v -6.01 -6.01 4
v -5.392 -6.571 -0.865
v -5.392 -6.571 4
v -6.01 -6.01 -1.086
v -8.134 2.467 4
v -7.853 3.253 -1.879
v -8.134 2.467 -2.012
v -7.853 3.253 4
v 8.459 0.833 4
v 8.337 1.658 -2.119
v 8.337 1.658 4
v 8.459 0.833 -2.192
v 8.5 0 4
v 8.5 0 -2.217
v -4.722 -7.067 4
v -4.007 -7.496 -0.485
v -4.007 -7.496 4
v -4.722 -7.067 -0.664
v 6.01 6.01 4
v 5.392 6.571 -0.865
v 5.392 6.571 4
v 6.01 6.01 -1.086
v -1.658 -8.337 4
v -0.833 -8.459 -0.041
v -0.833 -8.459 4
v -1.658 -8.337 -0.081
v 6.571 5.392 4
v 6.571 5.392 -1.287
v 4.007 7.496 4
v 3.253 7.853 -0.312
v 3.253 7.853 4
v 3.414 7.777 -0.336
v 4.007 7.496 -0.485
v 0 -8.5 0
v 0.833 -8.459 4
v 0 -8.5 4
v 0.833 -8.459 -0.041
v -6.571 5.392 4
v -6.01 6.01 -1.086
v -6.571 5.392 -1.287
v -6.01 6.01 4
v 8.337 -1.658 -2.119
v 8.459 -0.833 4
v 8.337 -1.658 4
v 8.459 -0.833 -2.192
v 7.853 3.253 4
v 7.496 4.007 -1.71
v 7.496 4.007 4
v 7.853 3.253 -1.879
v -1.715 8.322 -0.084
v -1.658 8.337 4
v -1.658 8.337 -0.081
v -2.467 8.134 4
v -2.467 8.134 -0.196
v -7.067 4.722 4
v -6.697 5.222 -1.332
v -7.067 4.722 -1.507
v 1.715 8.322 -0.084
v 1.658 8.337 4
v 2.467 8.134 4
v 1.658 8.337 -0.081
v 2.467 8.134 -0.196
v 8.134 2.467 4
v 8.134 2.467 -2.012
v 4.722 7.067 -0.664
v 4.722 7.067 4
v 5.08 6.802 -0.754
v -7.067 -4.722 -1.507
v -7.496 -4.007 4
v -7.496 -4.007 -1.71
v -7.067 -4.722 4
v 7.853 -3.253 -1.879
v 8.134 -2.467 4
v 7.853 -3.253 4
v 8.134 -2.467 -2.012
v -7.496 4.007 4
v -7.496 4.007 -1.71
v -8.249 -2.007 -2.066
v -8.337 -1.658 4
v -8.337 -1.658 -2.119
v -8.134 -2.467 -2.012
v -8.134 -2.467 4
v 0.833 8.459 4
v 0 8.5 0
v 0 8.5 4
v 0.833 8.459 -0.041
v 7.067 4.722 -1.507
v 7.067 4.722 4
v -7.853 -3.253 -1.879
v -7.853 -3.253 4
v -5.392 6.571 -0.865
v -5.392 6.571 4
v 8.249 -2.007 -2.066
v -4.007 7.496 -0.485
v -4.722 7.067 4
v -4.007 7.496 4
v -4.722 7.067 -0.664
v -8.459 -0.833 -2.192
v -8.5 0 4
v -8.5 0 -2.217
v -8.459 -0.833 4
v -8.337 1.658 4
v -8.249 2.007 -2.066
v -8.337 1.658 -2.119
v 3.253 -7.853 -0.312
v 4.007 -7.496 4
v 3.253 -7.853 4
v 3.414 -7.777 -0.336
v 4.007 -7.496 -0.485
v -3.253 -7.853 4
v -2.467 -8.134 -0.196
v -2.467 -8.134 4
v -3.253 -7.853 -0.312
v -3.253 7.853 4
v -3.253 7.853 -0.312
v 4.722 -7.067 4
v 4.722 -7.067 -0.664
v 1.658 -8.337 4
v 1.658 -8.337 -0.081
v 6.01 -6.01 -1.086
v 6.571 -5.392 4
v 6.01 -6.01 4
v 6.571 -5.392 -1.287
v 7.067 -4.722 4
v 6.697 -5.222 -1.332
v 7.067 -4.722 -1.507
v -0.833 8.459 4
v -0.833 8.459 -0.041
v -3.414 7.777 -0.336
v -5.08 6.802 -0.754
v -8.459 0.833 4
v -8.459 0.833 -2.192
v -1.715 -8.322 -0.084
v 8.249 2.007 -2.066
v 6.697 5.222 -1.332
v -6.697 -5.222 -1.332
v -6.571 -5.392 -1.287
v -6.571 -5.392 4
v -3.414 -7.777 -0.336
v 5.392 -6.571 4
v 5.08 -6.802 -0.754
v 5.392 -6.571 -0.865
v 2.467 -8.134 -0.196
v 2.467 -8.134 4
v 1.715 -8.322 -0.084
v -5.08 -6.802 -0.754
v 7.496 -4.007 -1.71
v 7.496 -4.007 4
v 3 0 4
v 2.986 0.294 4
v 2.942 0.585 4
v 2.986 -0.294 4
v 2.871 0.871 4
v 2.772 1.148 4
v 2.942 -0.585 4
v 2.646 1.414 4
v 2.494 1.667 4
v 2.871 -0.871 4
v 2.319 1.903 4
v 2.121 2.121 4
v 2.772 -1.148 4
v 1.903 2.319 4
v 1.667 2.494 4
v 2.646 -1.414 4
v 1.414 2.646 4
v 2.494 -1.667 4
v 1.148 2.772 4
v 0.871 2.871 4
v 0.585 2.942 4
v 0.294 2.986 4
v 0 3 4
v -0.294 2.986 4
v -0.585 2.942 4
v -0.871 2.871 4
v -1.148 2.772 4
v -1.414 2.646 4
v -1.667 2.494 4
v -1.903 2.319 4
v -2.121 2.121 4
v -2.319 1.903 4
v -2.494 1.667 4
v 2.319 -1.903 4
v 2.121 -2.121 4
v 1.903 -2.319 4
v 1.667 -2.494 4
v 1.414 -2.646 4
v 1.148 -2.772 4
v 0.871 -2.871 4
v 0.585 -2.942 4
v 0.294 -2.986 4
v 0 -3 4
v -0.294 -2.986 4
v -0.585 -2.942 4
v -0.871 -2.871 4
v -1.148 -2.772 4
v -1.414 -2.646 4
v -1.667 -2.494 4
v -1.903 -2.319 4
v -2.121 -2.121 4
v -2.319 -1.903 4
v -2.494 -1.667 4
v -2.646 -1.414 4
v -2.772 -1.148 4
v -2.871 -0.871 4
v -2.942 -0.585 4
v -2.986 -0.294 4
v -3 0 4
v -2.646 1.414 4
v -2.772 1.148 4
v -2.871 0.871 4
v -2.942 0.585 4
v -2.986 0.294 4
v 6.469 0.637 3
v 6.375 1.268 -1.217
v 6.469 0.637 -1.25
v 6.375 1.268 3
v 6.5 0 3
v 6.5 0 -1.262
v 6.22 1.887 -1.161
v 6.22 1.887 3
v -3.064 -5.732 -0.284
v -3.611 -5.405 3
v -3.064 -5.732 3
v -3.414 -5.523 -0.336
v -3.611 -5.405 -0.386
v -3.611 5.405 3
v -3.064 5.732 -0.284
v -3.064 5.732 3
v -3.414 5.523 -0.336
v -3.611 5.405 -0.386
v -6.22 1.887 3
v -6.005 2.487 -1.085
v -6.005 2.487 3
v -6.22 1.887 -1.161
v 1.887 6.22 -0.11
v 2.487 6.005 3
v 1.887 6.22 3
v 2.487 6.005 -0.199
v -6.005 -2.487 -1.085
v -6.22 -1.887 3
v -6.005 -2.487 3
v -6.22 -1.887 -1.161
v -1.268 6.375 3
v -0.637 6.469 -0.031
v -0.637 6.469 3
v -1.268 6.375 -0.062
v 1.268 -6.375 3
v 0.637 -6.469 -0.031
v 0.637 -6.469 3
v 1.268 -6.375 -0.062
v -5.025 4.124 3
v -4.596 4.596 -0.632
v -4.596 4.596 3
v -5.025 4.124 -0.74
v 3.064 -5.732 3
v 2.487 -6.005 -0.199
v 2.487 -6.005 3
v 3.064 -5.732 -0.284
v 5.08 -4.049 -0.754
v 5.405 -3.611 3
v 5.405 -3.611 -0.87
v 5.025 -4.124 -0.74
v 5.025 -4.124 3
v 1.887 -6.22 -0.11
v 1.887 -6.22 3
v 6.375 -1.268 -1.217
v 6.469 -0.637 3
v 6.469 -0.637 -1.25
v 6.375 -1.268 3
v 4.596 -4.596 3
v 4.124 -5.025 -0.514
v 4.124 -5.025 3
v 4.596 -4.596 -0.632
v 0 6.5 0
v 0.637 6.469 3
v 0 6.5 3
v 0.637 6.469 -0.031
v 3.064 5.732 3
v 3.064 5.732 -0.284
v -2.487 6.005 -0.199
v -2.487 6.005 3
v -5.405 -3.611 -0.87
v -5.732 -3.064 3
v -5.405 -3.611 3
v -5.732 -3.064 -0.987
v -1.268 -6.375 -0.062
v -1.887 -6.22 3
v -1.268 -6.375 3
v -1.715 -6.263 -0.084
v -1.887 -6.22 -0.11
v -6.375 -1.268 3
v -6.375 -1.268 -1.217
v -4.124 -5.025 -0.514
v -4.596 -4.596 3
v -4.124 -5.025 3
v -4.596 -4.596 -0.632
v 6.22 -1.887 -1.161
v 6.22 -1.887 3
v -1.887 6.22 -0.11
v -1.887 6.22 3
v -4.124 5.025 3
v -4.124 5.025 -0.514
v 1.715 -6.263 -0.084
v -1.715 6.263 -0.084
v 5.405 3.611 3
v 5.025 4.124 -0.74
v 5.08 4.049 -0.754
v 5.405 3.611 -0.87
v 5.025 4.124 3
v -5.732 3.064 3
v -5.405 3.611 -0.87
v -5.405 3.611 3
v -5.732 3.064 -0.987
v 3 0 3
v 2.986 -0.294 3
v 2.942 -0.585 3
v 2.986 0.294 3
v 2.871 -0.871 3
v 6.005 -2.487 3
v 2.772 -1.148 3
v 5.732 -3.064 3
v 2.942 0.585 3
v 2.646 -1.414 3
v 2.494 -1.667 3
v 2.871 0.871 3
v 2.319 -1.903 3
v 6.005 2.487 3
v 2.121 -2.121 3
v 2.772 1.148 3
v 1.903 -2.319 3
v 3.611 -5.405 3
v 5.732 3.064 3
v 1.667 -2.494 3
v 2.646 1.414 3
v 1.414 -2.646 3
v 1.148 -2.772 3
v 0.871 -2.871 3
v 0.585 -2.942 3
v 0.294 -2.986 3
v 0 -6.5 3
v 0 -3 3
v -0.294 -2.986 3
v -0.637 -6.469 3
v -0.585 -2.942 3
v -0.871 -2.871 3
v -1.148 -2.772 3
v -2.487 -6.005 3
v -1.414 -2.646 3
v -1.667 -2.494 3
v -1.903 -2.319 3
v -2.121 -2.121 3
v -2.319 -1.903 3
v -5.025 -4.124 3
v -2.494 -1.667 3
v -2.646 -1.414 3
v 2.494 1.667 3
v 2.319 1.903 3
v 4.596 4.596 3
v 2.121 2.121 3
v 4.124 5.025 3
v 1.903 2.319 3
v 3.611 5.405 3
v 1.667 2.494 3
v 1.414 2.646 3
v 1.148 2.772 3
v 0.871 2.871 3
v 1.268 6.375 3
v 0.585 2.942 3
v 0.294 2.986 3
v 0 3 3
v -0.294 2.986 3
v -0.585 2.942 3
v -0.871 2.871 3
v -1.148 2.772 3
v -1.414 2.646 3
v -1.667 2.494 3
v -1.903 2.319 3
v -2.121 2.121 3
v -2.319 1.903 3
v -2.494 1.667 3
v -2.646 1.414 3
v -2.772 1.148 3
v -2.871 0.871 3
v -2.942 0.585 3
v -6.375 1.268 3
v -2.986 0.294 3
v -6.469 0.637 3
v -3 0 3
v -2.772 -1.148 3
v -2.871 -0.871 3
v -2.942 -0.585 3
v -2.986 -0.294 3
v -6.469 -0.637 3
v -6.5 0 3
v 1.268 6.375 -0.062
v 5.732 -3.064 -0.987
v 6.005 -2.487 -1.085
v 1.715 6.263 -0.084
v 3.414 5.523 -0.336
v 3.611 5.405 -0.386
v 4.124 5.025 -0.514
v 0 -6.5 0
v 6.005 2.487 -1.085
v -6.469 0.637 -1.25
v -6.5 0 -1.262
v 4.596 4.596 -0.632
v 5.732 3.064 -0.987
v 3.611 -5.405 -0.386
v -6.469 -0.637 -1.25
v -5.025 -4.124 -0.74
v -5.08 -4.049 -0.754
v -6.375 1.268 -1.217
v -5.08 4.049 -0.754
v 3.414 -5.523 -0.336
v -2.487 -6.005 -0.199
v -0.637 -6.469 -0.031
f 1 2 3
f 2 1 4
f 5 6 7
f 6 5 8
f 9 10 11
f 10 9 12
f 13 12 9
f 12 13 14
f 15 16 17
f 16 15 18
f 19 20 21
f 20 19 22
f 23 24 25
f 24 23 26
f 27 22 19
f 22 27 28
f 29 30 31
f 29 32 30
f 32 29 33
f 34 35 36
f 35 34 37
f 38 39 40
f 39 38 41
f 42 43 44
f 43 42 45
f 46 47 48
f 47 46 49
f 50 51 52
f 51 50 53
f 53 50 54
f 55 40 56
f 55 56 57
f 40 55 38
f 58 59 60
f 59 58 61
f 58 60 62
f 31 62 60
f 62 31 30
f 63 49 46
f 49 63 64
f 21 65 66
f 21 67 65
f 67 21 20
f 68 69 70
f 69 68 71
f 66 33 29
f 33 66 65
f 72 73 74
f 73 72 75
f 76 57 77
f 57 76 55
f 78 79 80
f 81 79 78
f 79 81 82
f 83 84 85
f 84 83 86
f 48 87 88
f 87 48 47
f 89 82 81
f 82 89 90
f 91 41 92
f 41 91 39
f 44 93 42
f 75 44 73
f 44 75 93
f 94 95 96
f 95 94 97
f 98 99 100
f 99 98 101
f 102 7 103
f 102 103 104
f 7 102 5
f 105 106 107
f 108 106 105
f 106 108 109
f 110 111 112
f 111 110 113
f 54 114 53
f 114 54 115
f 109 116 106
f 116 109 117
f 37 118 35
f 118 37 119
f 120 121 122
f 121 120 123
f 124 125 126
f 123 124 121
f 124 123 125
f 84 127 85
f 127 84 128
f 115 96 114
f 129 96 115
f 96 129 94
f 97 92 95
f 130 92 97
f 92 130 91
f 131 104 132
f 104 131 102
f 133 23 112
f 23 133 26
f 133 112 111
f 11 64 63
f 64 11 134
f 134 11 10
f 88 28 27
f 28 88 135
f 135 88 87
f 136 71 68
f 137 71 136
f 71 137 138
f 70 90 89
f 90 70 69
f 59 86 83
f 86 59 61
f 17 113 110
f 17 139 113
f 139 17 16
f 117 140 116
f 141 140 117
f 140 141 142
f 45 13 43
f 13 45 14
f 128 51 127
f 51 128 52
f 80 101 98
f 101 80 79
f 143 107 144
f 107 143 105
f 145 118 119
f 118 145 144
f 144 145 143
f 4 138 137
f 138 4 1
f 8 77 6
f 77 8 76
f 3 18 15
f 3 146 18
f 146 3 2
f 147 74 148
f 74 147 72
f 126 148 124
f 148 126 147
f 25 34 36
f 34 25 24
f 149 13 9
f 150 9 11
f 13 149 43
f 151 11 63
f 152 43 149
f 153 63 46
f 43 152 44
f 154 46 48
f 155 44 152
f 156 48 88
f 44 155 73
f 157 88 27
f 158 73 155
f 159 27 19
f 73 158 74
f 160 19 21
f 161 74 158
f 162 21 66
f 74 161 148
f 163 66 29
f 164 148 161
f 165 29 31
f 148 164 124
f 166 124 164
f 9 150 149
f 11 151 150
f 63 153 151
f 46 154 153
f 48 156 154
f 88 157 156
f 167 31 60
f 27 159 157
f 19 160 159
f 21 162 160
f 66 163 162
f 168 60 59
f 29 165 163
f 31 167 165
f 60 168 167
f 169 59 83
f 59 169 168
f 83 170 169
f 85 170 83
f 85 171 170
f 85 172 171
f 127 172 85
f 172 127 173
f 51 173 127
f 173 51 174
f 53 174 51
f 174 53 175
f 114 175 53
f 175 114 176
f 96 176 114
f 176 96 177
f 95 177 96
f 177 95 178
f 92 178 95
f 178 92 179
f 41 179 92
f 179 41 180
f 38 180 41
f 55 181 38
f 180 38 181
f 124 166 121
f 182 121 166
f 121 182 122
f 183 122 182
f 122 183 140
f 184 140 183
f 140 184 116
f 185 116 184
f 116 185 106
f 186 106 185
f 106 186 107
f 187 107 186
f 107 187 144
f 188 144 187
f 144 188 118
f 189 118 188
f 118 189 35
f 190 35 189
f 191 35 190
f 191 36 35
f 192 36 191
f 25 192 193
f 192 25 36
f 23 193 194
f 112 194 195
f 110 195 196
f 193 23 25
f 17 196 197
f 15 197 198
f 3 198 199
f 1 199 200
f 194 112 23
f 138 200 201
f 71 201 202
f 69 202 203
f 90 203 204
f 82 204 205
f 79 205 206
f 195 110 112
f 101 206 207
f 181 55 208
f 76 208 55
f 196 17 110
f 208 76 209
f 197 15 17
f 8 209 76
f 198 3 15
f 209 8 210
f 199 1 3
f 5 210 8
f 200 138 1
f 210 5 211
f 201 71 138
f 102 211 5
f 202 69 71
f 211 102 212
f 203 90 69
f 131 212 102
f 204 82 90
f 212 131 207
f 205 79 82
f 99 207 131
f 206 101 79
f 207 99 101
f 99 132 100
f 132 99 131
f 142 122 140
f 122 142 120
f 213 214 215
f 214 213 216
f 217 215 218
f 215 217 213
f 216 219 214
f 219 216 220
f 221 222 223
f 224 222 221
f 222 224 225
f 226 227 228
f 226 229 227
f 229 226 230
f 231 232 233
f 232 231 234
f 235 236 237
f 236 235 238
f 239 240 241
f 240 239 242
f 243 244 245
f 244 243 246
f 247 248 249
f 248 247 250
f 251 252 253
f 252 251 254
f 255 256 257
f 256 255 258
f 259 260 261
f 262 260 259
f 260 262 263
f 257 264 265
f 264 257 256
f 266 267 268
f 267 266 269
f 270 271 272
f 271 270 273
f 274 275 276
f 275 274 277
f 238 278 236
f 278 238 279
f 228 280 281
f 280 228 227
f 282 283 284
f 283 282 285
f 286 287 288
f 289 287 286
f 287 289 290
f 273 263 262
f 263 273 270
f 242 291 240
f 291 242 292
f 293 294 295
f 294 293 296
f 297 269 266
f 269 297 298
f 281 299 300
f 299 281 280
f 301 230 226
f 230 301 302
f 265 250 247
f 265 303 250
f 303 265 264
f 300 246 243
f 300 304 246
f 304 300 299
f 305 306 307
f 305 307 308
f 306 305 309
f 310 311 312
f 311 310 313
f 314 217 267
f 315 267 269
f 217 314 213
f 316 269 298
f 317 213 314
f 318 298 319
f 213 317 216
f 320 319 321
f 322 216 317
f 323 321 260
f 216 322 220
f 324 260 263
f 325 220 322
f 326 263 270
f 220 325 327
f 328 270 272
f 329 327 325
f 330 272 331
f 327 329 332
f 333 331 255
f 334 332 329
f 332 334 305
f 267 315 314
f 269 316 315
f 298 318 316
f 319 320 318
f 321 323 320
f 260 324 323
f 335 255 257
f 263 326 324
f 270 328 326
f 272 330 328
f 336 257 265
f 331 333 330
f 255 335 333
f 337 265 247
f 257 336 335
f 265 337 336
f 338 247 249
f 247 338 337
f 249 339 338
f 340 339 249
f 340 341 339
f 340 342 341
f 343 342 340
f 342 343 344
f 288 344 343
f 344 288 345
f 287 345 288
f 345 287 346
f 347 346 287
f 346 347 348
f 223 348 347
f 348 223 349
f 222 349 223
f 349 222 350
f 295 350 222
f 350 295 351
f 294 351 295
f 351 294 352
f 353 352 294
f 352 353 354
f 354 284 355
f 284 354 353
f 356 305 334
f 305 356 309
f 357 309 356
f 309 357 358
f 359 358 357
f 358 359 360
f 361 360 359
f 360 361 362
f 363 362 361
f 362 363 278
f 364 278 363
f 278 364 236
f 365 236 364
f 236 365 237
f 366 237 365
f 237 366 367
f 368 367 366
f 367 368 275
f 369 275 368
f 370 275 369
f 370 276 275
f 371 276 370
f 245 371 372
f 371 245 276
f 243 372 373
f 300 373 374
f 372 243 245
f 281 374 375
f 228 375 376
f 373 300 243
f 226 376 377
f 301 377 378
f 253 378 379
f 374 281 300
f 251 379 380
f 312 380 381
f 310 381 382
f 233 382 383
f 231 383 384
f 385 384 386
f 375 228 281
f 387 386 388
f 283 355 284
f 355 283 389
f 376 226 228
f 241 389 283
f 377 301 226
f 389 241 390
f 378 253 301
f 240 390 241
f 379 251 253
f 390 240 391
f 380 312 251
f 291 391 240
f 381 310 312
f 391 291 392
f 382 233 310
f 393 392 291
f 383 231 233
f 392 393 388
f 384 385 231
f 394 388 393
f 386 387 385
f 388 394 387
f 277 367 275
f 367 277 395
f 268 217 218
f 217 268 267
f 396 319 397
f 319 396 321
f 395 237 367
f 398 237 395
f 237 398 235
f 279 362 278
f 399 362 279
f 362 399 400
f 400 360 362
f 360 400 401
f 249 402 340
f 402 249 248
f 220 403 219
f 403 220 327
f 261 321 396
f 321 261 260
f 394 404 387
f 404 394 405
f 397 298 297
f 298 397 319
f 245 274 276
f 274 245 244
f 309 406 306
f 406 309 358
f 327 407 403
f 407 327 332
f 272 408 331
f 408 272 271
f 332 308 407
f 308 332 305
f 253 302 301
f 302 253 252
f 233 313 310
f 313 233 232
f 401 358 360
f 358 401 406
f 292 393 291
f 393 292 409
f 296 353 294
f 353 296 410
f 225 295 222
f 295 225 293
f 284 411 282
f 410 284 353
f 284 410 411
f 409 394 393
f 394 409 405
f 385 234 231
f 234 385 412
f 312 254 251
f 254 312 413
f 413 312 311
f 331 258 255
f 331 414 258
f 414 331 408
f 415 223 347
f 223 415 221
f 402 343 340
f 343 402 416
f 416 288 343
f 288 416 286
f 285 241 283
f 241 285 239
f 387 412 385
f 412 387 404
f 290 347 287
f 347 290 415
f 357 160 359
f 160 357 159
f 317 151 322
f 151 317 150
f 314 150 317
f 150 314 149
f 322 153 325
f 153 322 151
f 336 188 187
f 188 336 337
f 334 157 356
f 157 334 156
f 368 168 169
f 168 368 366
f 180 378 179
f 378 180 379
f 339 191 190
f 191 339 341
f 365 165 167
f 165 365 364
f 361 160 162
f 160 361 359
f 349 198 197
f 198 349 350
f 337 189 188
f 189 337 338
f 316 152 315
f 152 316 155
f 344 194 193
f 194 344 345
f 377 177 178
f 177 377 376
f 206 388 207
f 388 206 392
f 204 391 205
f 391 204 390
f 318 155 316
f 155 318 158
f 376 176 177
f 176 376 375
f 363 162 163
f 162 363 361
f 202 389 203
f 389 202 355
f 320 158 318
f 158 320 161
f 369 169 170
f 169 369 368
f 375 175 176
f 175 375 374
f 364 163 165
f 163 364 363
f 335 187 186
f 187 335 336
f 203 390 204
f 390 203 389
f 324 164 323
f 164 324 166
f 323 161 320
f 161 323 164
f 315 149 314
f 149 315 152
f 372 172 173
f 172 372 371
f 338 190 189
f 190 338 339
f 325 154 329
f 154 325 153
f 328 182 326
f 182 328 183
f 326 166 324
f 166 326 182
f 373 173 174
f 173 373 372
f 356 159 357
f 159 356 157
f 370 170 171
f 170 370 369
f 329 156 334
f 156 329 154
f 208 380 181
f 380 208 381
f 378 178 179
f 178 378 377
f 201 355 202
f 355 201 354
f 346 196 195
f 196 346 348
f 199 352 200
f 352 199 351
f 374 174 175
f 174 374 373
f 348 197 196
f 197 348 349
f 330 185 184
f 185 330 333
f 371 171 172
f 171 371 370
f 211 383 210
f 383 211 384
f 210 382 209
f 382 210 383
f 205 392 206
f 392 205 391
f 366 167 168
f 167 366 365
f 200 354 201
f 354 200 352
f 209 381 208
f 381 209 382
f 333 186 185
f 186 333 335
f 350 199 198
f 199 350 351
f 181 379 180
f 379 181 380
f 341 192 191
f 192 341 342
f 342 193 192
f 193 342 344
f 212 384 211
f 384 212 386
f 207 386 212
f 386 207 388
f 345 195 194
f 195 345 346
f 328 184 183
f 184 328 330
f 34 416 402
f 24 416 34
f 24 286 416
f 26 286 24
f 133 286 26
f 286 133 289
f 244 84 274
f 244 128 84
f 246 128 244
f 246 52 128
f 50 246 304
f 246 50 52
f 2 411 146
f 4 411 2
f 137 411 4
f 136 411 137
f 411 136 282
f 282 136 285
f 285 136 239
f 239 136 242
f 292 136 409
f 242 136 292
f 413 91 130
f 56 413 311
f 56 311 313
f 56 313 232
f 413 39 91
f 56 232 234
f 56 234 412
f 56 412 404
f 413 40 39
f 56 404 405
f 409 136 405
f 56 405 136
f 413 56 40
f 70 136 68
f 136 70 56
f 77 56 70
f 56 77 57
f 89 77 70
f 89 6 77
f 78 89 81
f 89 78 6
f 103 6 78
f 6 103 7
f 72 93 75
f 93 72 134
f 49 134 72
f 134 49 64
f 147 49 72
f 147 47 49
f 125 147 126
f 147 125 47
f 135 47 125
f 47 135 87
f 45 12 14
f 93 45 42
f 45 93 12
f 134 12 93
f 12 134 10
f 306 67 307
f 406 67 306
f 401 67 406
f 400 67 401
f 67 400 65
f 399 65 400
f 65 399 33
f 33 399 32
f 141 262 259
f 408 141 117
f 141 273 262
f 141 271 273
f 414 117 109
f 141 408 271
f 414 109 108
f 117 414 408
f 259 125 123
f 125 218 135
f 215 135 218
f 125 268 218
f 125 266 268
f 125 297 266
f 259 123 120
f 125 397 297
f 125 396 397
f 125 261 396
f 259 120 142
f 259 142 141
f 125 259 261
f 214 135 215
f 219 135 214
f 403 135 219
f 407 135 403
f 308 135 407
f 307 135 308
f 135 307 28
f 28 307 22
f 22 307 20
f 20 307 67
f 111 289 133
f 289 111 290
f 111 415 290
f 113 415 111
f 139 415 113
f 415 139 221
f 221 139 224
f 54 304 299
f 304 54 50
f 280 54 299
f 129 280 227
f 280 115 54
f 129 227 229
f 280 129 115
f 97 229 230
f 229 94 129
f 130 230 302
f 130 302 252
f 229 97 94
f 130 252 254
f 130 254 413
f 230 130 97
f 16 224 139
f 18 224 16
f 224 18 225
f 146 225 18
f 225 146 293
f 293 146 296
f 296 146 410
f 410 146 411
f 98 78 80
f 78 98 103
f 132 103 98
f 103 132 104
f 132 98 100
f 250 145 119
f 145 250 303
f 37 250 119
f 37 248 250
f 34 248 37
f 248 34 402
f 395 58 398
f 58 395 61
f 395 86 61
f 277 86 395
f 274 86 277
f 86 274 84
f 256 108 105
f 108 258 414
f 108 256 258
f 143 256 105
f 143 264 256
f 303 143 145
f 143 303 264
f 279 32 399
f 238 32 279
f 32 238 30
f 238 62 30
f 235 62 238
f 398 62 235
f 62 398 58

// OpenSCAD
$fn=64;

difference() {
  translate([0,0,-3]) cylinder(r=8.5,h=7);
  translate([0,0,-3]) cylinder(r=6.5,h=6);
  translate([0,0,-3]) cylinder(r=3,h=8);
  translate([0,10,-17.5]) rotate([90,0,0]) cylinder(r=17.5, h=20);
}
